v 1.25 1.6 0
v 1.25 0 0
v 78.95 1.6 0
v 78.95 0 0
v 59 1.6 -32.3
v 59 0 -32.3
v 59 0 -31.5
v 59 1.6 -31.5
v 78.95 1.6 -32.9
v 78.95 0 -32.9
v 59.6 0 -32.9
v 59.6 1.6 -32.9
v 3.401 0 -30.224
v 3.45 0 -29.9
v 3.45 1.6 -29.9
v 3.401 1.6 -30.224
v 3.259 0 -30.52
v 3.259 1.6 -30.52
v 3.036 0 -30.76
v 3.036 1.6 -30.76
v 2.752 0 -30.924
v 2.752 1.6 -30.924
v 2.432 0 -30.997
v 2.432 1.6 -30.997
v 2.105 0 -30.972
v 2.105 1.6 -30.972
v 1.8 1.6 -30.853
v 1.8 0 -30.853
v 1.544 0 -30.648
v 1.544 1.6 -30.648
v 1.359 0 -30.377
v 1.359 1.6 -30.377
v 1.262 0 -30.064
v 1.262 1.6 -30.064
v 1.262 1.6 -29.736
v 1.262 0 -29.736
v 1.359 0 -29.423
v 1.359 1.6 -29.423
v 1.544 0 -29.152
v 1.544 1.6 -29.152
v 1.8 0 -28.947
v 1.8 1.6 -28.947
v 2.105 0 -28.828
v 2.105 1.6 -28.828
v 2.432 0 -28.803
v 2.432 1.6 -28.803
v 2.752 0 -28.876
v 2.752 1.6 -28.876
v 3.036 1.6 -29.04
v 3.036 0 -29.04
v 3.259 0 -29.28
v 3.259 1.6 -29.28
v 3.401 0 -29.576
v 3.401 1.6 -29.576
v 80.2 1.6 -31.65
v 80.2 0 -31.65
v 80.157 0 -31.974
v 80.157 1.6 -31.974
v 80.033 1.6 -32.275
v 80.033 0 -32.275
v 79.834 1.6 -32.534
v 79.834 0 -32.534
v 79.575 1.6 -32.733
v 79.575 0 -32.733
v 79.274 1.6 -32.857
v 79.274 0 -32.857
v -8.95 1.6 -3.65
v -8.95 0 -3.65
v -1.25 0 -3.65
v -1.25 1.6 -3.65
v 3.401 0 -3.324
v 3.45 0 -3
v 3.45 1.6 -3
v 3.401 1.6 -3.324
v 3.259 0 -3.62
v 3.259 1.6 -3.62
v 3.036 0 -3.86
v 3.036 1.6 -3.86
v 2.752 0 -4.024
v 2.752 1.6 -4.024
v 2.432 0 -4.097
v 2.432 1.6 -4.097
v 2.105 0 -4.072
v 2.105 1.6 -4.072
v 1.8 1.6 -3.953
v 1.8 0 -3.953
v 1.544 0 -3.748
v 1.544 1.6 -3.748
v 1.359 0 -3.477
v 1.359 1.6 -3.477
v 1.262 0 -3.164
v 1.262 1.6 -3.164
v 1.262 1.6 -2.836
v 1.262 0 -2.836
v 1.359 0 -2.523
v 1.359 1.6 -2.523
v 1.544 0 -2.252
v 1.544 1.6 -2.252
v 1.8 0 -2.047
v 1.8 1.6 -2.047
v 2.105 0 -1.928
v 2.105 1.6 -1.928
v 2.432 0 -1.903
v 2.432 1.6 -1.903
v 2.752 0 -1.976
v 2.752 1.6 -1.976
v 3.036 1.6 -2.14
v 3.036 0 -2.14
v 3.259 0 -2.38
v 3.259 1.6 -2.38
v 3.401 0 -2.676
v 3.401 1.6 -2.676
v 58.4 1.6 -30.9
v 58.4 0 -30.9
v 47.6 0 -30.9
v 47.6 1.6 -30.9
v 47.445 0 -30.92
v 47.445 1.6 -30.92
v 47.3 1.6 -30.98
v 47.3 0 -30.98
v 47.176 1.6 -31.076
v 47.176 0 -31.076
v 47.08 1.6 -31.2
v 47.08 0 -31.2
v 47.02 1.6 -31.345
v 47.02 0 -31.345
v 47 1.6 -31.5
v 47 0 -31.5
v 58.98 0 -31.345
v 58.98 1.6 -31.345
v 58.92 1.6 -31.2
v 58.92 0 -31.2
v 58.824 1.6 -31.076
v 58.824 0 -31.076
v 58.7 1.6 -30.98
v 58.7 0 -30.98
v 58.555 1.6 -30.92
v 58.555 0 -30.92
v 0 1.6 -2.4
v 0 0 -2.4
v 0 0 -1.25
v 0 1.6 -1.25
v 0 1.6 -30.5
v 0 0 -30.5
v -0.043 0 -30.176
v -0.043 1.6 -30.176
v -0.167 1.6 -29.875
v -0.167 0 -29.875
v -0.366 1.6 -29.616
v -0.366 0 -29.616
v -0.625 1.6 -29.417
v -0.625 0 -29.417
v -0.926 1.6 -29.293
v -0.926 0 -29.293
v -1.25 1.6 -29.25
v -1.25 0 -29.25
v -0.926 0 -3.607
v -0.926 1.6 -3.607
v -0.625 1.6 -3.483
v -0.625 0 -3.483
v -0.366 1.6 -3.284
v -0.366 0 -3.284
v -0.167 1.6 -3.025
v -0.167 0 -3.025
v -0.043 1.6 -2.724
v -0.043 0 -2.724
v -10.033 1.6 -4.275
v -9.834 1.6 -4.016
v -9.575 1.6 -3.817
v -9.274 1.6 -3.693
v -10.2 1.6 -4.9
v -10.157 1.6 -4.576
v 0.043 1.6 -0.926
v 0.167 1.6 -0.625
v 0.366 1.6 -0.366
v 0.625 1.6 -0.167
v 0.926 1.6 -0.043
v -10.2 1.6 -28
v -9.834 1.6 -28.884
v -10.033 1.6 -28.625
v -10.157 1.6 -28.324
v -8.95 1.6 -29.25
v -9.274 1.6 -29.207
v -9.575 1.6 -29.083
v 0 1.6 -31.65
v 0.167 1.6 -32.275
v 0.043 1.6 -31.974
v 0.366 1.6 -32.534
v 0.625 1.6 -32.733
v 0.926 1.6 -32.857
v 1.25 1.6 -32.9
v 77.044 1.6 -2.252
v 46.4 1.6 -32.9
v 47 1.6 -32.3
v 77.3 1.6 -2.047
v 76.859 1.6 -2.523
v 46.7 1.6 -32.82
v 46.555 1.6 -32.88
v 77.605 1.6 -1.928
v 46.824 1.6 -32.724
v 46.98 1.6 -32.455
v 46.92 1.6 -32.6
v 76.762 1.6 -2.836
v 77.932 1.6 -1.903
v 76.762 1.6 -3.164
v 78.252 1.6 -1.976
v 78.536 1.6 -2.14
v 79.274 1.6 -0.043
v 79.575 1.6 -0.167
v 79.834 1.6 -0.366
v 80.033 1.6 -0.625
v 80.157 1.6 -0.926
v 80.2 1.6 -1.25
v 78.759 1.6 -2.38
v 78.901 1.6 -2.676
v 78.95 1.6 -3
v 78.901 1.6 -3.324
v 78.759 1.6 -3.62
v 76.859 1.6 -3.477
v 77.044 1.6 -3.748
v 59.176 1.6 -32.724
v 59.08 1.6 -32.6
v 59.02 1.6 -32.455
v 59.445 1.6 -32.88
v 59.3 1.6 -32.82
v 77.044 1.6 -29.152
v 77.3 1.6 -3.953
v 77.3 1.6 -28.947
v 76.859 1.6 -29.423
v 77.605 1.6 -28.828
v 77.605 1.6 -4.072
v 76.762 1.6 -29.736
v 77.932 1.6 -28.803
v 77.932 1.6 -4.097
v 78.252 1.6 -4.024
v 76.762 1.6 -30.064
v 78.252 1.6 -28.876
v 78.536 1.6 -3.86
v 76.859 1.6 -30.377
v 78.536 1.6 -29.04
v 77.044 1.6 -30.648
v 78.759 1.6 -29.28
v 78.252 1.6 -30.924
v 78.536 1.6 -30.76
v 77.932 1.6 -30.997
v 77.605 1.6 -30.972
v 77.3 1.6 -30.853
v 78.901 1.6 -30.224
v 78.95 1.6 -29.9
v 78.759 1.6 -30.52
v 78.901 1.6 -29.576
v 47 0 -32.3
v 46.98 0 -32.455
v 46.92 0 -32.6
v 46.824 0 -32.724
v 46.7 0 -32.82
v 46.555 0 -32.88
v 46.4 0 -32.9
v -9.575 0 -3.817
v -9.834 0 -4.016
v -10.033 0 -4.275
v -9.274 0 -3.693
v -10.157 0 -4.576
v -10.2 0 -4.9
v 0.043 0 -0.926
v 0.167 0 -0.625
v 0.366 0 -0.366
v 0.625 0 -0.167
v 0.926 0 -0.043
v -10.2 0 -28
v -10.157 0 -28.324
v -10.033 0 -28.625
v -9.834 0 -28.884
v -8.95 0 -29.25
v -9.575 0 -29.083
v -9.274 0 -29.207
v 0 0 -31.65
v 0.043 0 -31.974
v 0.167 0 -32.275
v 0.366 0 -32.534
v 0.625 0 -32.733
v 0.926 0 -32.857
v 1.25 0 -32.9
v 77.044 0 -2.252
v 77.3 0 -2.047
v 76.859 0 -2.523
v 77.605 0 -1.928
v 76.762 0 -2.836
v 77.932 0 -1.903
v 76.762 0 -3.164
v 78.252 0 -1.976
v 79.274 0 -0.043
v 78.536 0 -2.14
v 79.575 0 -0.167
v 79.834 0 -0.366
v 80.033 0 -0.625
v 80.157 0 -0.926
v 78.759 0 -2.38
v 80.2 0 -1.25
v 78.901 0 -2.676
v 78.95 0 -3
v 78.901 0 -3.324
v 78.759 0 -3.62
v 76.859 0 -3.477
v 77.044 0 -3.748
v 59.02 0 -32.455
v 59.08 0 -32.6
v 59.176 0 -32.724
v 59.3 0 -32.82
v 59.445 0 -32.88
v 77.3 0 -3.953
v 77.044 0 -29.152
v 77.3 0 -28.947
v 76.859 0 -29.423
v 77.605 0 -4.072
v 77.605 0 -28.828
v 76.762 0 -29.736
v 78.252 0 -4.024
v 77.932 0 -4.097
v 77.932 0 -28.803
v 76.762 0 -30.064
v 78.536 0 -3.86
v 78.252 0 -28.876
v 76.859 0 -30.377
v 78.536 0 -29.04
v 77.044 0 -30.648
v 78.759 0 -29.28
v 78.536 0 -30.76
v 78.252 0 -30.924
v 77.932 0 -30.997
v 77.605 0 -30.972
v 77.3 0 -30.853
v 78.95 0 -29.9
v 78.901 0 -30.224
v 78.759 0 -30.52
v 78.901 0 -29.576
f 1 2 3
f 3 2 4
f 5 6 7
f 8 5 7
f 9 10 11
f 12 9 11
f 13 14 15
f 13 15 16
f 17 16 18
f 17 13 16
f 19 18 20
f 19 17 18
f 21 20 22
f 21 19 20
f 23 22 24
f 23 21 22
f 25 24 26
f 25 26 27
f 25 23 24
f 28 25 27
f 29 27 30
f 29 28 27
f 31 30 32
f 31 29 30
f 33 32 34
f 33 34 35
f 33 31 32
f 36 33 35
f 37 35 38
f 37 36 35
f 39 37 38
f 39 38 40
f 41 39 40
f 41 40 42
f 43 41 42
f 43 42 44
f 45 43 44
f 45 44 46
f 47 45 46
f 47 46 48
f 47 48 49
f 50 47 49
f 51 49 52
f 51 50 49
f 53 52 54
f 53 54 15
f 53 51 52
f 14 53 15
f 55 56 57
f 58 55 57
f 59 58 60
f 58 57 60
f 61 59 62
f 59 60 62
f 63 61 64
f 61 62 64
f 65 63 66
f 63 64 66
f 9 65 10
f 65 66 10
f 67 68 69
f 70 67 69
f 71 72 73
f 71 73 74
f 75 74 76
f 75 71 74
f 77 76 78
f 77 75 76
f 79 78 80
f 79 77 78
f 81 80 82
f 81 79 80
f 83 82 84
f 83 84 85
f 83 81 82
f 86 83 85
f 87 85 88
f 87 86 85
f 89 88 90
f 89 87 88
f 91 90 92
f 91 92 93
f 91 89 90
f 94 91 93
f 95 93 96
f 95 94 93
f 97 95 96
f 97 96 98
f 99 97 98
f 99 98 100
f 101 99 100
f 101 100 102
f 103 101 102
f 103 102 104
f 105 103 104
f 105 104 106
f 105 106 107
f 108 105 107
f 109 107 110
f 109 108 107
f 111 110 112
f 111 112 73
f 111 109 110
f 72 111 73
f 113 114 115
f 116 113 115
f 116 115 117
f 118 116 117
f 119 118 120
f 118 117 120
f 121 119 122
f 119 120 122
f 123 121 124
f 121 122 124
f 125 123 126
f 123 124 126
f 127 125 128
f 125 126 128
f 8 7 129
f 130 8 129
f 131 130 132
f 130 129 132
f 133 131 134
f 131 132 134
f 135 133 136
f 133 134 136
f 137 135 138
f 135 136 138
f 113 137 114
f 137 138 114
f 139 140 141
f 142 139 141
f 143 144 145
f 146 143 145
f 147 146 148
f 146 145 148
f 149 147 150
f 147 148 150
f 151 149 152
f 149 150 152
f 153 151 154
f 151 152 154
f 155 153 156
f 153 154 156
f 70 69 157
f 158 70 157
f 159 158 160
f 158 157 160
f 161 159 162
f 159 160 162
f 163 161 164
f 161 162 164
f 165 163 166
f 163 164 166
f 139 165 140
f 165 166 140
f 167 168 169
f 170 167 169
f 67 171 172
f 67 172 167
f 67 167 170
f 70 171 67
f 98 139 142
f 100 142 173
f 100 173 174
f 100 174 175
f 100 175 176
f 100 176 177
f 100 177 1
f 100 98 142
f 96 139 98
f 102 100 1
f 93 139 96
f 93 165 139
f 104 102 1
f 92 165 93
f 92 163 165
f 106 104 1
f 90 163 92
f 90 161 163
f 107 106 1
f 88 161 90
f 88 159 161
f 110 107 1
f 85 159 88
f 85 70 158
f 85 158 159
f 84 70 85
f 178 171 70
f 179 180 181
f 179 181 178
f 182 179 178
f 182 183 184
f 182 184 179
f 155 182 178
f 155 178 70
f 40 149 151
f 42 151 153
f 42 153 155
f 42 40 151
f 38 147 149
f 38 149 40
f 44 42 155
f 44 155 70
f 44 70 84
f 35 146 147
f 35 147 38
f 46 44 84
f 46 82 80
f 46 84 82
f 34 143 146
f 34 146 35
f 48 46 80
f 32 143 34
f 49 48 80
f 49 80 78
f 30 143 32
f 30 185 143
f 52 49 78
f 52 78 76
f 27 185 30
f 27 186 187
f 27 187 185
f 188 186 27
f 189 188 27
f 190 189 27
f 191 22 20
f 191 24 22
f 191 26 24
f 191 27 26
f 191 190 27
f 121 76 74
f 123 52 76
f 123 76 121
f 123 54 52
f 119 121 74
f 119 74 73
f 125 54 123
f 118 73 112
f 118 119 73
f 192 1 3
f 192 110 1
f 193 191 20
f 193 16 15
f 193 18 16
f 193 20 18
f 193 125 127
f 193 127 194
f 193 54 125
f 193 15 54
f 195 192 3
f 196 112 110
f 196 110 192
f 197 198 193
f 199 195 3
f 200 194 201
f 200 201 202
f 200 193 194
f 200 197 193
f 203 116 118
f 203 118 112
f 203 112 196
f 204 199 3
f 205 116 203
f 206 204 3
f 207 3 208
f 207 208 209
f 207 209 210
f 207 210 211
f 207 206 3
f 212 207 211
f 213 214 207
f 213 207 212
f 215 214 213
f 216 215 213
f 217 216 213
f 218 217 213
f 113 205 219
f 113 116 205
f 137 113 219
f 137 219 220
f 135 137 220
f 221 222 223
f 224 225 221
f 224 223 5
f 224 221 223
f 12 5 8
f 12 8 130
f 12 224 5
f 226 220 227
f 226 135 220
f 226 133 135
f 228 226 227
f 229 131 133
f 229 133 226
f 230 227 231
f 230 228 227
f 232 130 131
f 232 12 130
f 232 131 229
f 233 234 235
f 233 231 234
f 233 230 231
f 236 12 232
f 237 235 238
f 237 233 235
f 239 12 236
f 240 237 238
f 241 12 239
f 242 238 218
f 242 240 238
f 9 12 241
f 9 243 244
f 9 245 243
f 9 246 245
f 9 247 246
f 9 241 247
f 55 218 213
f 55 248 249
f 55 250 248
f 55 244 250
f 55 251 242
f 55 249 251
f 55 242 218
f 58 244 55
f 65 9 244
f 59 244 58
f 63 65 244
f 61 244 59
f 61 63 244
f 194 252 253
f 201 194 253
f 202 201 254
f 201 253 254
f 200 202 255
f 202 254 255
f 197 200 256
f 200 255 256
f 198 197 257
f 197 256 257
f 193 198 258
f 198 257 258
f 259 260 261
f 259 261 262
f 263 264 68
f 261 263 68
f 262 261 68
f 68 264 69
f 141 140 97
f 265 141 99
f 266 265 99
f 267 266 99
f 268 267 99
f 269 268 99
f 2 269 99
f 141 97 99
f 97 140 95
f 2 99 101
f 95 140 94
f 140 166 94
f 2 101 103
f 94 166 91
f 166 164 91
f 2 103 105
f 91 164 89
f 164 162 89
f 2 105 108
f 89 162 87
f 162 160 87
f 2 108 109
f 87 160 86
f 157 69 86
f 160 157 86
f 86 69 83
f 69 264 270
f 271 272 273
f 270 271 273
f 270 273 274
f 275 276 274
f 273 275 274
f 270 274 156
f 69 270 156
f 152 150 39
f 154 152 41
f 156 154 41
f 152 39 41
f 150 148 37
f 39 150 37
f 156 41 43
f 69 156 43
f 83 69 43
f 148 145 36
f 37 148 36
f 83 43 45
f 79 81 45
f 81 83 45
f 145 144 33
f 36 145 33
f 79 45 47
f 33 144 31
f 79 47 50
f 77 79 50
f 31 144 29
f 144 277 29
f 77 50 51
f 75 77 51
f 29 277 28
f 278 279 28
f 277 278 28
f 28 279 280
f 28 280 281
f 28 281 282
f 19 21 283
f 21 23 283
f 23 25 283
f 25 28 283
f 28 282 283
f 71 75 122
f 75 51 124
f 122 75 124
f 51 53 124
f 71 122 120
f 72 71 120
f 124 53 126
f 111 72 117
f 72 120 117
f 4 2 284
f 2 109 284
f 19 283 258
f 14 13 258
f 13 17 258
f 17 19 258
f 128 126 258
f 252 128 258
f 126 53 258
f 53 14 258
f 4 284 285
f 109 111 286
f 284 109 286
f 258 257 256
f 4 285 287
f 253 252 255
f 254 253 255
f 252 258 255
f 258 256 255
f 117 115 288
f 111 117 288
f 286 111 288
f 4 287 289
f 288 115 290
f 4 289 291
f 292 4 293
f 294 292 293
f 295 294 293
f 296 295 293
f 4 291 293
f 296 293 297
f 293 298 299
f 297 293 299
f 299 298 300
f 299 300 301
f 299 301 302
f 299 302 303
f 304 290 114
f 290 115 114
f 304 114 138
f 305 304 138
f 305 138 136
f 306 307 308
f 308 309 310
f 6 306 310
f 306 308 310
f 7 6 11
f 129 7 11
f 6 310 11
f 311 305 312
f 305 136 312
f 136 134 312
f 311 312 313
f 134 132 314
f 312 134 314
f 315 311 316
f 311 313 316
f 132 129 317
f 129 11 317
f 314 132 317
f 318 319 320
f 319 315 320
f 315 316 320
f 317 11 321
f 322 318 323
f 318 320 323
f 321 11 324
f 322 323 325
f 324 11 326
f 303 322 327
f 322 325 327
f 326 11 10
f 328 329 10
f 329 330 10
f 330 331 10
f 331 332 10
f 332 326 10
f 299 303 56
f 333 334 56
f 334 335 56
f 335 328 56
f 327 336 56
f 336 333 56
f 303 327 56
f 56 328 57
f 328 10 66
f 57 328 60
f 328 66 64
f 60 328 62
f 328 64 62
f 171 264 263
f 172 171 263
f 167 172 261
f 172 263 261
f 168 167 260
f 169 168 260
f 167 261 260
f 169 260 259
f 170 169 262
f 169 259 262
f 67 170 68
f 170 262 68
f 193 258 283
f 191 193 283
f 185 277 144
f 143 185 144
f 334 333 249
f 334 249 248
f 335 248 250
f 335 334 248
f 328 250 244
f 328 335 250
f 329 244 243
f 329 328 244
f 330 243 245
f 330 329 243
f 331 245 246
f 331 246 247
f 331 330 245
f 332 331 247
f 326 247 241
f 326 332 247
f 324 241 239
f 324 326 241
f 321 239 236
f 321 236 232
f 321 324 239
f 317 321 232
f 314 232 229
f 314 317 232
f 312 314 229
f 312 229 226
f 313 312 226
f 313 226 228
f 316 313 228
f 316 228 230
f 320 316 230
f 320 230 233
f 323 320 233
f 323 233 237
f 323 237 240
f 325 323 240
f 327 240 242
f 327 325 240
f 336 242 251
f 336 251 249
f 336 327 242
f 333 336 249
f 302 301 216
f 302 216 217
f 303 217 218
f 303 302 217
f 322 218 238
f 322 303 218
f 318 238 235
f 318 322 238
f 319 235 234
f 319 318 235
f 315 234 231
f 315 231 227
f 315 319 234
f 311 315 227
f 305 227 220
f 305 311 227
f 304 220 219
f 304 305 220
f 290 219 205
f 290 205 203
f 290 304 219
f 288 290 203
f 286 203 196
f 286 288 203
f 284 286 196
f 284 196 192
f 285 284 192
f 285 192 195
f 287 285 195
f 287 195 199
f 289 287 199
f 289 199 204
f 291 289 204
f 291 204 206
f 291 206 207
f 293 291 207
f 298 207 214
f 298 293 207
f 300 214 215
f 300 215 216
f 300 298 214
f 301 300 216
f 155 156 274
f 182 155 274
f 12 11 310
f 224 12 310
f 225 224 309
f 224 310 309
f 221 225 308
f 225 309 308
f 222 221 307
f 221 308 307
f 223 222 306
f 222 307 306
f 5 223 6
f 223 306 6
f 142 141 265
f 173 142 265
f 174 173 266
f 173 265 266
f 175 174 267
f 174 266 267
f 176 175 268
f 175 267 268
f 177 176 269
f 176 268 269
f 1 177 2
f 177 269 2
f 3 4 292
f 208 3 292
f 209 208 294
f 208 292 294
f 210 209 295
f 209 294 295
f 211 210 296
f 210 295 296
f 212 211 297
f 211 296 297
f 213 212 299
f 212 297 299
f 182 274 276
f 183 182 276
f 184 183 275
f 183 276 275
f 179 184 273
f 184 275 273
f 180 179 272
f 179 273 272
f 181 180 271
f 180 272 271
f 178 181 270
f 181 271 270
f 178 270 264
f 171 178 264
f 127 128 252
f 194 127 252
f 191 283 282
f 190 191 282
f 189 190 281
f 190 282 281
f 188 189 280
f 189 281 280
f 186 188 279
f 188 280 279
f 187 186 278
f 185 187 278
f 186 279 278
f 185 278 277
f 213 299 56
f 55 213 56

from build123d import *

# Parameters (mm, degrees)
SKETCH_1_R      = 1.1
EXTRUDE_1_DEPTH = 1.6


with BuildPart() as part:
    # 草图1 → 凸台-拉伸1 (new body)
    with BuildSketch(Plane(origin=(0, 0, 0), x_dir=(1, 0, 0), z_dir=(0, 1, 0))):
        with BuildLine():
            ThreePointArc((0, 1.25), (0.366116524, 0.366116524), (1.25, 0))
            Line((1.25, 0), (78.95, 0))
            ThreePointArc((78.95, 0), (79.833883476, 0.366116524), (80.2, 1.25))
            Line((80.2, 1.25), (80.2, 31.65))
            ThreePointArc((80.2, 31.65), (79.833883476, 32.533883476), (78.95, 32.9))
            Line((78.95, 32.9), (59.6, 32.9))
            ThreePointArc((59.6, 32.9), (59.175735931, 32.724264069), (59, 32.3))
            Line((59, 32.3), (59, 31.5))
            ThreePointArc((59, 31.5), (58.824264069, 31.075735931), (58.4, 30.9))
            Line((58.4, 30.9), (47.6, 30.9))
            ThreePointArc((47.6, 30.9), (47.175735931, 31.075735931), (47, 31.5))
            Line((47, 31.5), (47, 32.3))
            ThreePointArc((47, 32.3), (46.824264069, 32.724264069), (46.4, 32.9))
            Line((46.4, 32.9), (1.25, 32.9))
            ThreePointArc((1.25, 32.9), (0.366116524, 32.533883476), (0, 31.65))
            Line((0, 31.65), (0, 30.5))
            ThreePointArc((0, 30.5), (-0.366116524, 29.616116524), (-1.25, 29.25))
            Line((-1.25, 29.25), (-8.95, 29.25))
            ThreePointArc((-8.95, 29.25), (-9.833883476, 28.883883476), (-10.2, 28))
            Line((-10.2, 28), (-10.2, 4.9))
            ThreePointArc((-10.2, 4.9), (-9.833883476, 4.016116524), (-8.95, 3.65))
            Line((-8.95, 3.65), (-1.25, 3.65))
            ThreePointArc((-1.25, 3.65), (-0.366116524, 3.283883476), (0, 2.4))
            Line((0, 2.4), (0, 1.25))
        make_face()
        with Locations((2.35, 3)):
            Circle(SKETCH_1_R, mode=Mode.SUBTRACT)
        with Locations((77.85, 3)):
            Circle(SKETCH_1_R, mode=Mode.SUBTRACT)
        with Locations((2.35, 29.9)):
            Circle(SKETCH_1_R, mode=Mode.SUBTRACT)
        with Locations((77.85, 29.9)):
            Circle(SKETCH_1_R, mode=Mode.SUBTRACT)
    extrude(amount=EXTRUDE_1_DEPTH)


solid = part.part
